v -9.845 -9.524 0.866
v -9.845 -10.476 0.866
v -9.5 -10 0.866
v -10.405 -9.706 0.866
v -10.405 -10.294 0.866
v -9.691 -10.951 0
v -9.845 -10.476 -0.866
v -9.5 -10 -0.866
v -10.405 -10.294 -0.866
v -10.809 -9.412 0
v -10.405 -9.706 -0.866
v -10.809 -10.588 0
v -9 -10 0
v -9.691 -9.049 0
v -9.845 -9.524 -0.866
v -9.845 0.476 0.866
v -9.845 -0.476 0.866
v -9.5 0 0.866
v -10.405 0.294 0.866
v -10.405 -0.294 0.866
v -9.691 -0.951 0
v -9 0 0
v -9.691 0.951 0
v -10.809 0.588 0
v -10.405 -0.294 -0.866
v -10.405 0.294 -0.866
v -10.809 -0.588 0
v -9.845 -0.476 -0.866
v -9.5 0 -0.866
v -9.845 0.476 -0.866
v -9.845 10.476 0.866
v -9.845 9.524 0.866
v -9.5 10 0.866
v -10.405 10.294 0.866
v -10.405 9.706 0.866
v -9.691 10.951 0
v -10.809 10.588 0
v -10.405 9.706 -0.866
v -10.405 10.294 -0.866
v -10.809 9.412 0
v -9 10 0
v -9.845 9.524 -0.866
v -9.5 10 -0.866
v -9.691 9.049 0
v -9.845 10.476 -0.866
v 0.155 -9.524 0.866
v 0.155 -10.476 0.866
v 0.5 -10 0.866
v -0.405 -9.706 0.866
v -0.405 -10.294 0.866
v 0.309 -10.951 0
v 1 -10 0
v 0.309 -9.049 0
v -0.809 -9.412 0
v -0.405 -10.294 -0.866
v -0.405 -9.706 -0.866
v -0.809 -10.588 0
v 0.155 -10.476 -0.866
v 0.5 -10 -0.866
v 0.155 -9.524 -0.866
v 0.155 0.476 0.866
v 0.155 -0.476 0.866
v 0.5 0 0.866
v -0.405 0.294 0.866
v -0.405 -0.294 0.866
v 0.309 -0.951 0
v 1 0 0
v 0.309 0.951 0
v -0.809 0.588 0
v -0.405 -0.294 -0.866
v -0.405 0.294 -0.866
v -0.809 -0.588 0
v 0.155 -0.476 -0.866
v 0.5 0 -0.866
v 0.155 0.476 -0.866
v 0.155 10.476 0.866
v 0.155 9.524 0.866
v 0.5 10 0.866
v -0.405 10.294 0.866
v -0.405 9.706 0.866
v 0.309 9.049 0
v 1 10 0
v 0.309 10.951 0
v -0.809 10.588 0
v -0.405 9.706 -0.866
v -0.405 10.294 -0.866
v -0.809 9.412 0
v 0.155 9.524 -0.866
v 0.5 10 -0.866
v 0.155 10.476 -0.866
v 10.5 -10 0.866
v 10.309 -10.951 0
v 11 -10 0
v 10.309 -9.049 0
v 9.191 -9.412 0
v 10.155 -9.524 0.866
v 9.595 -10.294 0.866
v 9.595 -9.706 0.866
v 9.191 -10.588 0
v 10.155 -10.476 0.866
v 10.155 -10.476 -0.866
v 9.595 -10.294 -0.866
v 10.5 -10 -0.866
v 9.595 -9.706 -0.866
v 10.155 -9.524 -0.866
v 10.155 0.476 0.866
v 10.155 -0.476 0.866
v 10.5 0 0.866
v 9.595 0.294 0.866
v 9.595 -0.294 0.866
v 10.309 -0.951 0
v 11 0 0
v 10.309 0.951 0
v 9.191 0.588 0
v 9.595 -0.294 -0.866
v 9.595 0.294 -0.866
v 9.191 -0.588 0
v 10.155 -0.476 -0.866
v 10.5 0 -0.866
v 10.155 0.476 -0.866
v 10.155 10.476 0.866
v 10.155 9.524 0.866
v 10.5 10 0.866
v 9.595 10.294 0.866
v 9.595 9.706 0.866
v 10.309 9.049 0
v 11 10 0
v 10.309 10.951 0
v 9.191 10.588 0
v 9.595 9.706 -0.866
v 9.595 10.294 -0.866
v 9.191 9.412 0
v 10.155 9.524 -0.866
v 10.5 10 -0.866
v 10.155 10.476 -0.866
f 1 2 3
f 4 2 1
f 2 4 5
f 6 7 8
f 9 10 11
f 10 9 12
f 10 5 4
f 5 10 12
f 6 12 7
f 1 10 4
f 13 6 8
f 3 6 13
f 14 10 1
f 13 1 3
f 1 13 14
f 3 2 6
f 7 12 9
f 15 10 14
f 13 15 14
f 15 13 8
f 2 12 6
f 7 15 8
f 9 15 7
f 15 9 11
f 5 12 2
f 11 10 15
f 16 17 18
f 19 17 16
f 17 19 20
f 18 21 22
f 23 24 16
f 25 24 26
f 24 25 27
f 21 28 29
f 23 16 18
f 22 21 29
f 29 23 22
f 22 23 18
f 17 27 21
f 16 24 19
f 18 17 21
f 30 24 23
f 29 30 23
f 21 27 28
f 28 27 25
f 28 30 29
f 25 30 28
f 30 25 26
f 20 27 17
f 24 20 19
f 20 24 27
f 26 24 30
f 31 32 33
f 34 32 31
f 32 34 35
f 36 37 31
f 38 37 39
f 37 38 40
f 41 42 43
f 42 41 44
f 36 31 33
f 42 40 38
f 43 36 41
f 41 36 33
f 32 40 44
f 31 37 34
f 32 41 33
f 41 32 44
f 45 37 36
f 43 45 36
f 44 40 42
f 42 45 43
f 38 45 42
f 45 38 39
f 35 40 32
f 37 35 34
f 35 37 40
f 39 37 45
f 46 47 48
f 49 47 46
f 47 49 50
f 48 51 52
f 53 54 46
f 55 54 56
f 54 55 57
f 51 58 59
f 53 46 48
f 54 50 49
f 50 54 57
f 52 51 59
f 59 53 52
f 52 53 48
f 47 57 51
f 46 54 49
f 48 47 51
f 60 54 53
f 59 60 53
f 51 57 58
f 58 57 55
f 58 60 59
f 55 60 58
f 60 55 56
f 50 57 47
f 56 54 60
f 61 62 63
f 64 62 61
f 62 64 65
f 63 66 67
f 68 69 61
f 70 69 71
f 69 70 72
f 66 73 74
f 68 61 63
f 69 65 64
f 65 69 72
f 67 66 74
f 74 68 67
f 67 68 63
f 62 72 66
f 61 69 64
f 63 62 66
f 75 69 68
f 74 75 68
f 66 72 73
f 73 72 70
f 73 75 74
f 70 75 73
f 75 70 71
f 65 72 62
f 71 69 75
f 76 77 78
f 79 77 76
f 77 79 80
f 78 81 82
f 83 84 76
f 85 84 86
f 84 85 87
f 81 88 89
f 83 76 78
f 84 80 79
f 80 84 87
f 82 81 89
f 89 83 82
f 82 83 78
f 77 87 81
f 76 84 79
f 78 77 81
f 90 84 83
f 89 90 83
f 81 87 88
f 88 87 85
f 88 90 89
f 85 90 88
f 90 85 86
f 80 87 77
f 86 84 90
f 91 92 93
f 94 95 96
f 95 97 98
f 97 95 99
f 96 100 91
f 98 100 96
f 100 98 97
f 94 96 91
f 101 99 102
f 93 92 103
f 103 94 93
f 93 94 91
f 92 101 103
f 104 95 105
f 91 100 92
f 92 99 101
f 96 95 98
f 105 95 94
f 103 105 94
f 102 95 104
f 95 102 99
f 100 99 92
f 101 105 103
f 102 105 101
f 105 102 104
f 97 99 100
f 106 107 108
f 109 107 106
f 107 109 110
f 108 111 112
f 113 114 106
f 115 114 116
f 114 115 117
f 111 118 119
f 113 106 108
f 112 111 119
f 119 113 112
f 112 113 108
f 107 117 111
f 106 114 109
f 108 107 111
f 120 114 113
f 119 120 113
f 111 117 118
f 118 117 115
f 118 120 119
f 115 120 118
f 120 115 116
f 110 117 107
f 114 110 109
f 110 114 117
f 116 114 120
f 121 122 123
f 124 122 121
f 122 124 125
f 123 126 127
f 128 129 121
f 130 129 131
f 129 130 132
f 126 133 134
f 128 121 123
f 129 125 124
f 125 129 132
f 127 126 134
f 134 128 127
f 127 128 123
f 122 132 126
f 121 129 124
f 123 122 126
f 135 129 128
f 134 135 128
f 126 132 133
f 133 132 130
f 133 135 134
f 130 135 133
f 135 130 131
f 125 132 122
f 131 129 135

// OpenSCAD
// BOSL-style grid2d() - 2D grid of children
module grid2d(size = [10, 10], count = [3, 3]) {
    sx = size[0] / (count[0] - 1);
    sy = size[1] / (count[1] - 1);
    for (i = [0 : count[0] - 1]) {
        for (j = [0 : count[1] - 1]) {
            translate([i * sx - size[0]/2, j * sy - size[1]/2, 0])
                children();
        }
    }
}

grid2d(size = [20, 20], count = [3, 3]) sphere(1);
